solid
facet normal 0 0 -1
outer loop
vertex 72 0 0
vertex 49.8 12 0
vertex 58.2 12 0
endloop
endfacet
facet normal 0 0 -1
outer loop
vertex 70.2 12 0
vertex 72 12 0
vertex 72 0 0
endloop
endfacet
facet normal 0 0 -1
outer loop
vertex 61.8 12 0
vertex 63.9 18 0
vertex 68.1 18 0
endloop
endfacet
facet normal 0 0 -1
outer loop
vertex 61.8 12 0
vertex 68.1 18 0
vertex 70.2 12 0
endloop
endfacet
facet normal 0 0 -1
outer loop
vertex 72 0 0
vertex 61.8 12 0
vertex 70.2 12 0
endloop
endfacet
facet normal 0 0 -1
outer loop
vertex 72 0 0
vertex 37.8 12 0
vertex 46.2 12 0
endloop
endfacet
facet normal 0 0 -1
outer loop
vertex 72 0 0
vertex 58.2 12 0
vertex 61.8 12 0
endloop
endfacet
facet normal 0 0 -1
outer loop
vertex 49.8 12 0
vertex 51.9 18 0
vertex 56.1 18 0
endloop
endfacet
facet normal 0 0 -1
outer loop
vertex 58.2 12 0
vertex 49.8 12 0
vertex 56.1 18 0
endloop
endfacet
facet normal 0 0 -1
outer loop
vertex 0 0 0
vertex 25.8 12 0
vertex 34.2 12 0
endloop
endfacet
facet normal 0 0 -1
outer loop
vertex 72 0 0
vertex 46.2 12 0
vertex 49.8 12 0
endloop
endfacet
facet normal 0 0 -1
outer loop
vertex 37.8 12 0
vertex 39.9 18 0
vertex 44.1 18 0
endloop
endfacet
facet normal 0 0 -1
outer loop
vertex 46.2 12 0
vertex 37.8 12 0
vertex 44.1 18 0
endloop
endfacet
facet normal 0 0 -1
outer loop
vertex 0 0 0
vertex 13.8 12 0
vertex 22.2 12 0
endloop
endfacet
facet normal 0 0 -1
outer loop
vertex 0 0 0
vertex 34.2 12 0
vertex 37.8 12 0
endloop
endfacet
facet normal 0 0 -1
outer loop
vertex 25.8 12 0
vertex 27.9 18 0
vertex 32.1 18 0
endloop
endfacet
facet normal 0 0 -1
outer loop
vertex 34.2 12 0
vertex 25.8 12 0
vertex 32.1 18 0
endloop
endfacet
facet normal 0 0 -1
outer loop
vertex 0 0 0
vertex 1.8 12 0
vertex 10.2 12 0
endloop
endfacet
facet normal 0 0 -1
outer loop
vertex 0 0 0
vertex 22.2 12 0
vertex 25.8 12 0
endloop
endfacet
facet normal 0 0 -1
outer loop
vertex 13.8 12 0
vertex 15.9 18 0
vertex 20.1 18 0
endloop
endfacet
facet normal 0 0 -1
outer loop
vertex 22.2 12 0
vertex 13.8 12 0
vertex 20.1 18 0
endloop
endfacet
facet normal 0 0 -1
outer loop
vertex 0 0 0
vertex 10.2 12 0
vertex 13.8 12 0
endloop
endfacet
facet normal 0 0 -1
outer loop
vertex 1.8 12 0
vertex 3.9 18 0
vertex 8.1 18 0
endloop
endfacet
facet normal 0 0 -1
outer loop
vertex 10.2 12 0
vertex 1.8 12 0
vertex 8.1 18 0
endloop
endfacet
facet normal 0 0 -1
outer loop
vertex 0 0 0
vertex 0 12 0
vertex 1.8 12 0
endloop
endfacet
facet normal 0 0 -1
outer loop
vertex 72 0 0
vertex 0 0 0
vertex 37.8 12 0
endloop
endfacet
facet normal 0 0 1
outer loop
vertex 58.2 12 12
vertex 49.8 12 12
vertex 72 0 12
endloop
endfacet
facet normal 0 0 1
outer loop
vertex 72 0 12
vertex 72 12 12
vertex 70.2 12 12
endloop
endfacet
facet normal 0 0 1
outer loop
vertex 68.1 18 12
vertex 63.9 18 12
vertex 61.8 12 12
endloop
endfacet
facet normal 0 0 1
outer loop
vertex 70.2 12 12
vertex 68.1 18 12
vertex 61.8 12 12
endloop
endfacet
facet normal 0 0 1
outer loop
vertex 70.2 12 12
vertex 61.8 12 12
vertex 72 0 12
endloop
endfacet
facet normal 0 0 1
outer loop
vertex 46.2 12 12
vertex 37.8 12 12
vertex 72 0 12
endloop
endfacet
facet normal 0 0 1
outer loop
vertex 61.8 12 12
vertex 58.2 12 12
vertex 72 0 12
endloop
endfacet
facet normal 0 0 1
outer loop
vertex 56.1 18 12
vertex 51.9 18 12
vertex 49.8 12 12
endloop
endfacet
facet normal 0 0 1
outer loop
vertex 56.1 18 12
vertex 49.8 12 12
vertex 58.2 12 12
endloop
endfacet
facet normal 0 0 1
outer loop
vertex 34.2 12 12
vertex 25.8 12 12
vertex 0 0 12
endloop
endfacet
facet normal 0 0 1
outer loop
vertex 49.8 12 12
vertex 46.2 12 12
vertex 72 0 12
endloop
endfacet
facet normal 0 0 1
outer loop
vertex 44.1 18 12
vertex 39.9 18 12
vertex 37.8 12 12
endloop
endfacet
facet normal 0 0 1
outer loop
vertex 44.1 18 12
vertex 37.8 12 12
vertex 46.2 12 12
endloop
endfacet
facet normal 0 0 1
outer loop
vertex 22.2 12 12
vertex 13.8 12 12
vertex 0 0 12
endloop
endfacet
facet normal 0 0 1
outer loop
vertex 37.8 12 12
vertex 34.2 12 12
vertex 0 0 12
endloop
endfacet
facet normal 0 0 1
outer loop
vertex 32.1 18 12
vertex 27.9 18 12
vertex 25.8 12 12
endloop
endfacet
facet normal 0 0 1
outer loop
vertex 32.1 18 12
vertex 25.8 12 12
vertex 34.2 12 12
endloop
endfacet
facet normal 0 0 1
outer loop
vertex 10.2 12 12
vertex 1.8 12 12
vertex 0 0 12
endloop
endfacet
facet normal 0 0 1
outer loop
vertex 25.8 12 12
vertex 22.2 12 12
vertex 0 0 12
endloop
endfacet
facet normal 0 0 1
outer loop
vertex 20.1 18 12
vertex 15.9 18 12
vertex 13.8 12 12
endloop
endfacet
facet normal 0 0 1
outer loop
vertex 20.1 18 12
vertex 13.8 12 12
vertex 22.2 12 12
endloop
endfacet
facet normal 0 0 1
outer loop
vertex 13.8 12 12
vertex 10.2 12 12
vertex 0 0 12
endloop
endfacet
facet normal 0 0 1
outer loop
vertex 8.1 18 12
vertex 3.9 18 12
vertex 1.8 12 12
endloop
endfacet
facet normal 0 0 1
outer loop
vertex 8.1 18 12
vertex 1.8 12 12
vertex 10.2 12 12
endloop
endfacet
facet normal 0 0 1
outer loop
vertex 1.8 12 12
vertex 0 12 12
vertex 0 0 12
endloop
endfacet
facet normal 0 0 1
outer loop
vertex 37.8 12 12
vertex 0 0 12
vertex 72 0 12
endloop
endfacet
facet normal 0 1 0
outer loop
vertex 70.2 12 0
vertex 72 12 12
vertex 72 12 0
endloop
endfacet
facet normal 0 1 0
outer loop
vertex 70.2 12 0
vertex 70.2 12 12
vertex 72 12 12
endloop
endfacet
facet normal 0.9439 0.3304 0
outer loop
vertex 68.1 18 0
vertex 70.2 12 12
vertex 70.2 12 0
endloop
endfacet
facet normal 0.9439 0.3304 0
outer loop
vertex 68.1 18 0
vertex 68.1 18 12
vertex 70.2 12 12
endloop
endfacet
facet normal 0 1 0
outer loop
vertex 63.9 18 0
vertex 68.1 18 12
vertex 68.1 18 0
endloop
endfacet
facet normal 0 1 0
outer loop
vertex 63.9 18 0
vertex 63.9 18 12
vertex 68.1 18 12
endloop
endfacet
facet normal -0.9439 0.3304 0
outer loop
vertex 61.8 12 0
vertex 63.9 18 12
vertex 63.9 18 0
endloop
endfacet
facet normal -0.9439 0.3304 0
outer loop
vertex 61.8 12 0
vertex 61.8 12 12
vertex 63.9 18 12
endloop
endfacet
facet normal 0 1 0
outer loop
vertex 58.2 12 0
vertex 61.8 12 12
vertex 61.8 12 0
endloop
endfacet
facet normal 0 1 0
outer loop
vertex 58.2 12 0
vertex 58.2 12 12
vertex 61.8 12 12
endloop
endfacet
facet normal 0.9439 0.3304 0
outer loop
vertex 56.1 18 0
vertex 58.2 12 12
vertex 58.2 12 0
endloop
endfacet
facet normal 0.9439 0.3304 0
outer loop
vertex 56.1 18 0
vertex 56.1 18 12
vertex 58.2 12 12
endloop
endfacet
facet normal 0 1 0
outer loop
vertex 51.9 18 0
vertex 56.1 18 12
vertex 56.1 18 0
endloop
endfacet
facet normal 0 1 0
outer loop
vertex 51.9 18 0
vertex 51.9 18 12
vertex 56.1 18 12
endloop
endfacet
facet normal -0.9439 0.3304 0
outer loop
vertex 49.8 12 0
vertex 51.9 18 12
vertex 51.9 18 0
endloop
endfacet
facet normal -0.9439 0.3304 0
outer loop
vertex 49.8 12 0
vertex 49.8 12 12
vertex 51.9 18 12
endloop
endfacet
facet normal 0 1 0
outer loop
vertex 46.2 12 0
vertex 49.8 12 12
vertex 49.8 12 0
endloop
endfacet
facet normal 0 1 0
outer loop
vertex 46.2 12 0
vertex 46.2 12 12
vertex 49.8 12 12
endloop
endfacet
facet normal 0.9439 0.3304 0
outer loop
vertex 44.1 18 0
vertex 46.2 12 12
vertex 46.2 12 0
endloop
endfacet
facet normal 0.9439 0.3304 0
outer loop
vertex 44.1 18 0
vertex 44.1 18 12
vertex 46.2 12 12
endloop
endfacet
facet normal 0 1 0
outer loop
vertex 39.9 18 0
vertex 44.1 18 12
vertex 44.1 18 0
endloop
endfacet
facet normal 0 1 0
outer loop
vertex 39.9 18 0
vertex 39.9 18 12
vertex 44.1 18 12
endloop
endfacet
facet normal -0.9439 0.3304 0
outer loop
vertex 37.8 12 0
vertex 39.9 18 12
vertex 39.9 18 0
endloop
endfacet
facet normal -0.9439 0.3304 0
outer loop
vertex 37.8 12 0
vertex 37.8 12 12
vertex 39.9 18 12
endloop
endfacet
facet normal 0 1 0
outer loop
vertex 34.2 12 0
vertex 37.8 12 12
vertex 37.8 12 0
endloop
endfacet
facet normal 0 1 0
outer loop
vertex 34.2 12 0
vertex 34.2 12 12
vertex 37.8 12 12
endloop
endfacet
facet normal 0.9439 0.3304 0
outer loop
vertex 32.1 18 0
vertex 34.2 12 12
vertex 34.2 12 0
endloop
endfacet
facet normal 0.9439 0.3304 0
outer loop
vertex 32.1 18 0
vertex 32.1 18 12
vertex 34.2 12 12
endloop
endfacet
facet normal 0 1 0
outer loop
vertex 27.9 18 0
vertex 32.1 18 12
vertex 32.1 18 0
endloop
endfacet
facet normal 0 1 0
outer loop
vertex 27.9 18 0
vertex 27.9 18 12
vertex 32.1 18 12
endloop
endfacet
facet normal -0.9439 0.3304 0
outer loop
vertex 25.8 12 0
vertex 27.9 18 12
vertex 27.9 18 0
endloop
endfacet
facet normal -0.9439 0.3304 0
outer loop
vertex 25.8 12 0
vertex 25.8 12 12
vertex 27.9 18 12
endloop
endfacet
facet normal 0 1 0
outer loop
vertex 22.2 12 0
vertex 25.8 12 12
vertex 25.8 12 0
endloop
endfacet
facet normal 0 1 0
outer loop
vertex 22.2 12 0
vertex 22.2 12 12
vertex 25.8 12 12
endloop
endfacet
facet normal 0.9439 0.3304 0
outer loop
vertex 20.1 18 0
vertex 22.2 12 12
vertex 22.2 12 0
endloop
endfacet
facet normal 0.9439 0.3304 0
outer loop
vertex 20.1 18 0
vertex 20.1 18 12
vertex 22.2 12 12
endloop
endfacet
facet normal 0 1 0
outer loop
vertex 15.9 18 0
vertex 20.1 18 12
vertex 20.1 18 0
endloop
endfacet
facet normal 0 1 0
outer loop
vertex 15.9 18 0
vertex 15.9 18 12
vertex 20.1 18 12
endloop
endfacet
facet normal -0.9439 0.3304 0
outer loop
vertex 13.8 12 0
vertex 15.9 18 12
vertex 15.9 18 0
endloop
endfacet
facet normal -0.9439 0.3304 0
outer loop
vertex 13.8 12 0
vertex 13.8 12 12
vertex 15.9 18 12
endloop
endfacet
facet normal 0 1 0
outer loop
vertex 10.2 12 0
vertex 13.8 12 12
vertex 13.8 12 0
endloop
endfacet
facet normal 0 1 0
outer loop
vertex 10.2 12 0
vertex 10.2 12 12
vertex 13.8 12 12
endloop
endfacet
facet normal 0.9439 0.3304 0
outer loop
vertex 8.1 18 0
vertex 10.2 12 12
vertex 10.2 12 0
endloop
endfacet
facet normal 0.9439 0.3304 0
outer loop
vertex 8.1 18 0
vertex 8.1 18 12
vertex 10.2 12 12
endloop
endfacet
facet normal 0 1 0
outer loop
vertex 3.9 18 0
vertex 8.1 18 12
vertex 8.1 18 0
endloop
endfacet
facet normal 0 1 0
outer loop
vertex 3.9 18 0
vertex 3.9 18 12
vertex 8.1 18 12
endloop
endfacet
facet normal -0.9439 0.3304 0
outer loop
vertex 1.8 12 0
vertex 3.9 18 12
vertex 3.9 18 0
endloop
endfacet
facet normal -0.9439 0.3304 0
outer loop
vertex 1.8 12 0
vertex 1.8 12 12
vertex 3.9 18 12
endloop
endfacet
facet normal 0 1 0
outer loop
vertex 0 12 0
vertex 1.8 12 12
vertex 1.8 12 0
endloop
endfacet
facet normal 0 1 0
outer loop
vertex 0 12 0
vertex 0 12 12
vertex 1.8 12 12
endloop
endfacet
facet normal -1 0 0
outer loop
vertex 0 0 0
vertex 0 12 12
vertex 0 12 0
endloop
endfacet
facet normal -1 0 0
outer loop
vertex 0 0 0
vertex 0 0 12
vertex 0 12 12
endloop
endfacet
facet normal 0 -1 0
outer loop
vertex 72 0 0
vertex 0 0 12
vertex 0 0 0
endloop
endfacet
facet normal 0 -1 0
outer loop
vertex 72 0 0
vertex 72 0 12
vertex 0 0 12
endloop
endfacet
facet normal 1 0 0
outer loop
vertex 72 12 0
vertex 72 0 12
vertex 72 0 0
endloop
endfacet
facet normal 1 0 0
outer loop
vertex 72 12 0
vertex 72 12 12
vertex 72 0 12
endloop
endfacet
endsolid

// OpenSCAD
$fn = 32;

// ----------------------------------------------------------------------
// Gear rack: 6 teeth, pitch 12 mm
// ----------------------------------------------------------------------

// --- parameters (mm) ---
teeth = 6;                // number of teeth
pitch = 12;               // tooth pitch, X
root_w = 8.4;             // tooth width at the root
tip_w = 4.2;              // tooth width at the tip
base_h = 12;              // rack body height, Y
tooth_h = 6;              // tooth height above the body
plate_t = 12;             // rack width, Z (extrusion height)

rack_l = teeth * pitch;  // overall length
total_h = base_h + tooth_h;  // overall height

profile = [[0, 0], [72, 0], [72, 12], [70.2, 12], [68.1, 18], [63.9, 18], [61.8, 12], [58.2, 12], [56.1, 18], [51.9, 18], [49.8, 12], [46.2, 12], [44.1, 18], [39.9, 18], [37.8, 12], [34.2, 12], [32.1, 18], [27.9, 18], [25.8, 12], [22.2, 12], [20.1, 18], [15.9, 18], [13.8, 12], [10.2, 12], [8.1, 18], [3.9, 18], [1.8, 12], [0, 12]];  // primary outline, 28 points, counter clockwise

// --- the one profile operation ---
linear_extrude(height = plate_t) polygon(points = profile);
